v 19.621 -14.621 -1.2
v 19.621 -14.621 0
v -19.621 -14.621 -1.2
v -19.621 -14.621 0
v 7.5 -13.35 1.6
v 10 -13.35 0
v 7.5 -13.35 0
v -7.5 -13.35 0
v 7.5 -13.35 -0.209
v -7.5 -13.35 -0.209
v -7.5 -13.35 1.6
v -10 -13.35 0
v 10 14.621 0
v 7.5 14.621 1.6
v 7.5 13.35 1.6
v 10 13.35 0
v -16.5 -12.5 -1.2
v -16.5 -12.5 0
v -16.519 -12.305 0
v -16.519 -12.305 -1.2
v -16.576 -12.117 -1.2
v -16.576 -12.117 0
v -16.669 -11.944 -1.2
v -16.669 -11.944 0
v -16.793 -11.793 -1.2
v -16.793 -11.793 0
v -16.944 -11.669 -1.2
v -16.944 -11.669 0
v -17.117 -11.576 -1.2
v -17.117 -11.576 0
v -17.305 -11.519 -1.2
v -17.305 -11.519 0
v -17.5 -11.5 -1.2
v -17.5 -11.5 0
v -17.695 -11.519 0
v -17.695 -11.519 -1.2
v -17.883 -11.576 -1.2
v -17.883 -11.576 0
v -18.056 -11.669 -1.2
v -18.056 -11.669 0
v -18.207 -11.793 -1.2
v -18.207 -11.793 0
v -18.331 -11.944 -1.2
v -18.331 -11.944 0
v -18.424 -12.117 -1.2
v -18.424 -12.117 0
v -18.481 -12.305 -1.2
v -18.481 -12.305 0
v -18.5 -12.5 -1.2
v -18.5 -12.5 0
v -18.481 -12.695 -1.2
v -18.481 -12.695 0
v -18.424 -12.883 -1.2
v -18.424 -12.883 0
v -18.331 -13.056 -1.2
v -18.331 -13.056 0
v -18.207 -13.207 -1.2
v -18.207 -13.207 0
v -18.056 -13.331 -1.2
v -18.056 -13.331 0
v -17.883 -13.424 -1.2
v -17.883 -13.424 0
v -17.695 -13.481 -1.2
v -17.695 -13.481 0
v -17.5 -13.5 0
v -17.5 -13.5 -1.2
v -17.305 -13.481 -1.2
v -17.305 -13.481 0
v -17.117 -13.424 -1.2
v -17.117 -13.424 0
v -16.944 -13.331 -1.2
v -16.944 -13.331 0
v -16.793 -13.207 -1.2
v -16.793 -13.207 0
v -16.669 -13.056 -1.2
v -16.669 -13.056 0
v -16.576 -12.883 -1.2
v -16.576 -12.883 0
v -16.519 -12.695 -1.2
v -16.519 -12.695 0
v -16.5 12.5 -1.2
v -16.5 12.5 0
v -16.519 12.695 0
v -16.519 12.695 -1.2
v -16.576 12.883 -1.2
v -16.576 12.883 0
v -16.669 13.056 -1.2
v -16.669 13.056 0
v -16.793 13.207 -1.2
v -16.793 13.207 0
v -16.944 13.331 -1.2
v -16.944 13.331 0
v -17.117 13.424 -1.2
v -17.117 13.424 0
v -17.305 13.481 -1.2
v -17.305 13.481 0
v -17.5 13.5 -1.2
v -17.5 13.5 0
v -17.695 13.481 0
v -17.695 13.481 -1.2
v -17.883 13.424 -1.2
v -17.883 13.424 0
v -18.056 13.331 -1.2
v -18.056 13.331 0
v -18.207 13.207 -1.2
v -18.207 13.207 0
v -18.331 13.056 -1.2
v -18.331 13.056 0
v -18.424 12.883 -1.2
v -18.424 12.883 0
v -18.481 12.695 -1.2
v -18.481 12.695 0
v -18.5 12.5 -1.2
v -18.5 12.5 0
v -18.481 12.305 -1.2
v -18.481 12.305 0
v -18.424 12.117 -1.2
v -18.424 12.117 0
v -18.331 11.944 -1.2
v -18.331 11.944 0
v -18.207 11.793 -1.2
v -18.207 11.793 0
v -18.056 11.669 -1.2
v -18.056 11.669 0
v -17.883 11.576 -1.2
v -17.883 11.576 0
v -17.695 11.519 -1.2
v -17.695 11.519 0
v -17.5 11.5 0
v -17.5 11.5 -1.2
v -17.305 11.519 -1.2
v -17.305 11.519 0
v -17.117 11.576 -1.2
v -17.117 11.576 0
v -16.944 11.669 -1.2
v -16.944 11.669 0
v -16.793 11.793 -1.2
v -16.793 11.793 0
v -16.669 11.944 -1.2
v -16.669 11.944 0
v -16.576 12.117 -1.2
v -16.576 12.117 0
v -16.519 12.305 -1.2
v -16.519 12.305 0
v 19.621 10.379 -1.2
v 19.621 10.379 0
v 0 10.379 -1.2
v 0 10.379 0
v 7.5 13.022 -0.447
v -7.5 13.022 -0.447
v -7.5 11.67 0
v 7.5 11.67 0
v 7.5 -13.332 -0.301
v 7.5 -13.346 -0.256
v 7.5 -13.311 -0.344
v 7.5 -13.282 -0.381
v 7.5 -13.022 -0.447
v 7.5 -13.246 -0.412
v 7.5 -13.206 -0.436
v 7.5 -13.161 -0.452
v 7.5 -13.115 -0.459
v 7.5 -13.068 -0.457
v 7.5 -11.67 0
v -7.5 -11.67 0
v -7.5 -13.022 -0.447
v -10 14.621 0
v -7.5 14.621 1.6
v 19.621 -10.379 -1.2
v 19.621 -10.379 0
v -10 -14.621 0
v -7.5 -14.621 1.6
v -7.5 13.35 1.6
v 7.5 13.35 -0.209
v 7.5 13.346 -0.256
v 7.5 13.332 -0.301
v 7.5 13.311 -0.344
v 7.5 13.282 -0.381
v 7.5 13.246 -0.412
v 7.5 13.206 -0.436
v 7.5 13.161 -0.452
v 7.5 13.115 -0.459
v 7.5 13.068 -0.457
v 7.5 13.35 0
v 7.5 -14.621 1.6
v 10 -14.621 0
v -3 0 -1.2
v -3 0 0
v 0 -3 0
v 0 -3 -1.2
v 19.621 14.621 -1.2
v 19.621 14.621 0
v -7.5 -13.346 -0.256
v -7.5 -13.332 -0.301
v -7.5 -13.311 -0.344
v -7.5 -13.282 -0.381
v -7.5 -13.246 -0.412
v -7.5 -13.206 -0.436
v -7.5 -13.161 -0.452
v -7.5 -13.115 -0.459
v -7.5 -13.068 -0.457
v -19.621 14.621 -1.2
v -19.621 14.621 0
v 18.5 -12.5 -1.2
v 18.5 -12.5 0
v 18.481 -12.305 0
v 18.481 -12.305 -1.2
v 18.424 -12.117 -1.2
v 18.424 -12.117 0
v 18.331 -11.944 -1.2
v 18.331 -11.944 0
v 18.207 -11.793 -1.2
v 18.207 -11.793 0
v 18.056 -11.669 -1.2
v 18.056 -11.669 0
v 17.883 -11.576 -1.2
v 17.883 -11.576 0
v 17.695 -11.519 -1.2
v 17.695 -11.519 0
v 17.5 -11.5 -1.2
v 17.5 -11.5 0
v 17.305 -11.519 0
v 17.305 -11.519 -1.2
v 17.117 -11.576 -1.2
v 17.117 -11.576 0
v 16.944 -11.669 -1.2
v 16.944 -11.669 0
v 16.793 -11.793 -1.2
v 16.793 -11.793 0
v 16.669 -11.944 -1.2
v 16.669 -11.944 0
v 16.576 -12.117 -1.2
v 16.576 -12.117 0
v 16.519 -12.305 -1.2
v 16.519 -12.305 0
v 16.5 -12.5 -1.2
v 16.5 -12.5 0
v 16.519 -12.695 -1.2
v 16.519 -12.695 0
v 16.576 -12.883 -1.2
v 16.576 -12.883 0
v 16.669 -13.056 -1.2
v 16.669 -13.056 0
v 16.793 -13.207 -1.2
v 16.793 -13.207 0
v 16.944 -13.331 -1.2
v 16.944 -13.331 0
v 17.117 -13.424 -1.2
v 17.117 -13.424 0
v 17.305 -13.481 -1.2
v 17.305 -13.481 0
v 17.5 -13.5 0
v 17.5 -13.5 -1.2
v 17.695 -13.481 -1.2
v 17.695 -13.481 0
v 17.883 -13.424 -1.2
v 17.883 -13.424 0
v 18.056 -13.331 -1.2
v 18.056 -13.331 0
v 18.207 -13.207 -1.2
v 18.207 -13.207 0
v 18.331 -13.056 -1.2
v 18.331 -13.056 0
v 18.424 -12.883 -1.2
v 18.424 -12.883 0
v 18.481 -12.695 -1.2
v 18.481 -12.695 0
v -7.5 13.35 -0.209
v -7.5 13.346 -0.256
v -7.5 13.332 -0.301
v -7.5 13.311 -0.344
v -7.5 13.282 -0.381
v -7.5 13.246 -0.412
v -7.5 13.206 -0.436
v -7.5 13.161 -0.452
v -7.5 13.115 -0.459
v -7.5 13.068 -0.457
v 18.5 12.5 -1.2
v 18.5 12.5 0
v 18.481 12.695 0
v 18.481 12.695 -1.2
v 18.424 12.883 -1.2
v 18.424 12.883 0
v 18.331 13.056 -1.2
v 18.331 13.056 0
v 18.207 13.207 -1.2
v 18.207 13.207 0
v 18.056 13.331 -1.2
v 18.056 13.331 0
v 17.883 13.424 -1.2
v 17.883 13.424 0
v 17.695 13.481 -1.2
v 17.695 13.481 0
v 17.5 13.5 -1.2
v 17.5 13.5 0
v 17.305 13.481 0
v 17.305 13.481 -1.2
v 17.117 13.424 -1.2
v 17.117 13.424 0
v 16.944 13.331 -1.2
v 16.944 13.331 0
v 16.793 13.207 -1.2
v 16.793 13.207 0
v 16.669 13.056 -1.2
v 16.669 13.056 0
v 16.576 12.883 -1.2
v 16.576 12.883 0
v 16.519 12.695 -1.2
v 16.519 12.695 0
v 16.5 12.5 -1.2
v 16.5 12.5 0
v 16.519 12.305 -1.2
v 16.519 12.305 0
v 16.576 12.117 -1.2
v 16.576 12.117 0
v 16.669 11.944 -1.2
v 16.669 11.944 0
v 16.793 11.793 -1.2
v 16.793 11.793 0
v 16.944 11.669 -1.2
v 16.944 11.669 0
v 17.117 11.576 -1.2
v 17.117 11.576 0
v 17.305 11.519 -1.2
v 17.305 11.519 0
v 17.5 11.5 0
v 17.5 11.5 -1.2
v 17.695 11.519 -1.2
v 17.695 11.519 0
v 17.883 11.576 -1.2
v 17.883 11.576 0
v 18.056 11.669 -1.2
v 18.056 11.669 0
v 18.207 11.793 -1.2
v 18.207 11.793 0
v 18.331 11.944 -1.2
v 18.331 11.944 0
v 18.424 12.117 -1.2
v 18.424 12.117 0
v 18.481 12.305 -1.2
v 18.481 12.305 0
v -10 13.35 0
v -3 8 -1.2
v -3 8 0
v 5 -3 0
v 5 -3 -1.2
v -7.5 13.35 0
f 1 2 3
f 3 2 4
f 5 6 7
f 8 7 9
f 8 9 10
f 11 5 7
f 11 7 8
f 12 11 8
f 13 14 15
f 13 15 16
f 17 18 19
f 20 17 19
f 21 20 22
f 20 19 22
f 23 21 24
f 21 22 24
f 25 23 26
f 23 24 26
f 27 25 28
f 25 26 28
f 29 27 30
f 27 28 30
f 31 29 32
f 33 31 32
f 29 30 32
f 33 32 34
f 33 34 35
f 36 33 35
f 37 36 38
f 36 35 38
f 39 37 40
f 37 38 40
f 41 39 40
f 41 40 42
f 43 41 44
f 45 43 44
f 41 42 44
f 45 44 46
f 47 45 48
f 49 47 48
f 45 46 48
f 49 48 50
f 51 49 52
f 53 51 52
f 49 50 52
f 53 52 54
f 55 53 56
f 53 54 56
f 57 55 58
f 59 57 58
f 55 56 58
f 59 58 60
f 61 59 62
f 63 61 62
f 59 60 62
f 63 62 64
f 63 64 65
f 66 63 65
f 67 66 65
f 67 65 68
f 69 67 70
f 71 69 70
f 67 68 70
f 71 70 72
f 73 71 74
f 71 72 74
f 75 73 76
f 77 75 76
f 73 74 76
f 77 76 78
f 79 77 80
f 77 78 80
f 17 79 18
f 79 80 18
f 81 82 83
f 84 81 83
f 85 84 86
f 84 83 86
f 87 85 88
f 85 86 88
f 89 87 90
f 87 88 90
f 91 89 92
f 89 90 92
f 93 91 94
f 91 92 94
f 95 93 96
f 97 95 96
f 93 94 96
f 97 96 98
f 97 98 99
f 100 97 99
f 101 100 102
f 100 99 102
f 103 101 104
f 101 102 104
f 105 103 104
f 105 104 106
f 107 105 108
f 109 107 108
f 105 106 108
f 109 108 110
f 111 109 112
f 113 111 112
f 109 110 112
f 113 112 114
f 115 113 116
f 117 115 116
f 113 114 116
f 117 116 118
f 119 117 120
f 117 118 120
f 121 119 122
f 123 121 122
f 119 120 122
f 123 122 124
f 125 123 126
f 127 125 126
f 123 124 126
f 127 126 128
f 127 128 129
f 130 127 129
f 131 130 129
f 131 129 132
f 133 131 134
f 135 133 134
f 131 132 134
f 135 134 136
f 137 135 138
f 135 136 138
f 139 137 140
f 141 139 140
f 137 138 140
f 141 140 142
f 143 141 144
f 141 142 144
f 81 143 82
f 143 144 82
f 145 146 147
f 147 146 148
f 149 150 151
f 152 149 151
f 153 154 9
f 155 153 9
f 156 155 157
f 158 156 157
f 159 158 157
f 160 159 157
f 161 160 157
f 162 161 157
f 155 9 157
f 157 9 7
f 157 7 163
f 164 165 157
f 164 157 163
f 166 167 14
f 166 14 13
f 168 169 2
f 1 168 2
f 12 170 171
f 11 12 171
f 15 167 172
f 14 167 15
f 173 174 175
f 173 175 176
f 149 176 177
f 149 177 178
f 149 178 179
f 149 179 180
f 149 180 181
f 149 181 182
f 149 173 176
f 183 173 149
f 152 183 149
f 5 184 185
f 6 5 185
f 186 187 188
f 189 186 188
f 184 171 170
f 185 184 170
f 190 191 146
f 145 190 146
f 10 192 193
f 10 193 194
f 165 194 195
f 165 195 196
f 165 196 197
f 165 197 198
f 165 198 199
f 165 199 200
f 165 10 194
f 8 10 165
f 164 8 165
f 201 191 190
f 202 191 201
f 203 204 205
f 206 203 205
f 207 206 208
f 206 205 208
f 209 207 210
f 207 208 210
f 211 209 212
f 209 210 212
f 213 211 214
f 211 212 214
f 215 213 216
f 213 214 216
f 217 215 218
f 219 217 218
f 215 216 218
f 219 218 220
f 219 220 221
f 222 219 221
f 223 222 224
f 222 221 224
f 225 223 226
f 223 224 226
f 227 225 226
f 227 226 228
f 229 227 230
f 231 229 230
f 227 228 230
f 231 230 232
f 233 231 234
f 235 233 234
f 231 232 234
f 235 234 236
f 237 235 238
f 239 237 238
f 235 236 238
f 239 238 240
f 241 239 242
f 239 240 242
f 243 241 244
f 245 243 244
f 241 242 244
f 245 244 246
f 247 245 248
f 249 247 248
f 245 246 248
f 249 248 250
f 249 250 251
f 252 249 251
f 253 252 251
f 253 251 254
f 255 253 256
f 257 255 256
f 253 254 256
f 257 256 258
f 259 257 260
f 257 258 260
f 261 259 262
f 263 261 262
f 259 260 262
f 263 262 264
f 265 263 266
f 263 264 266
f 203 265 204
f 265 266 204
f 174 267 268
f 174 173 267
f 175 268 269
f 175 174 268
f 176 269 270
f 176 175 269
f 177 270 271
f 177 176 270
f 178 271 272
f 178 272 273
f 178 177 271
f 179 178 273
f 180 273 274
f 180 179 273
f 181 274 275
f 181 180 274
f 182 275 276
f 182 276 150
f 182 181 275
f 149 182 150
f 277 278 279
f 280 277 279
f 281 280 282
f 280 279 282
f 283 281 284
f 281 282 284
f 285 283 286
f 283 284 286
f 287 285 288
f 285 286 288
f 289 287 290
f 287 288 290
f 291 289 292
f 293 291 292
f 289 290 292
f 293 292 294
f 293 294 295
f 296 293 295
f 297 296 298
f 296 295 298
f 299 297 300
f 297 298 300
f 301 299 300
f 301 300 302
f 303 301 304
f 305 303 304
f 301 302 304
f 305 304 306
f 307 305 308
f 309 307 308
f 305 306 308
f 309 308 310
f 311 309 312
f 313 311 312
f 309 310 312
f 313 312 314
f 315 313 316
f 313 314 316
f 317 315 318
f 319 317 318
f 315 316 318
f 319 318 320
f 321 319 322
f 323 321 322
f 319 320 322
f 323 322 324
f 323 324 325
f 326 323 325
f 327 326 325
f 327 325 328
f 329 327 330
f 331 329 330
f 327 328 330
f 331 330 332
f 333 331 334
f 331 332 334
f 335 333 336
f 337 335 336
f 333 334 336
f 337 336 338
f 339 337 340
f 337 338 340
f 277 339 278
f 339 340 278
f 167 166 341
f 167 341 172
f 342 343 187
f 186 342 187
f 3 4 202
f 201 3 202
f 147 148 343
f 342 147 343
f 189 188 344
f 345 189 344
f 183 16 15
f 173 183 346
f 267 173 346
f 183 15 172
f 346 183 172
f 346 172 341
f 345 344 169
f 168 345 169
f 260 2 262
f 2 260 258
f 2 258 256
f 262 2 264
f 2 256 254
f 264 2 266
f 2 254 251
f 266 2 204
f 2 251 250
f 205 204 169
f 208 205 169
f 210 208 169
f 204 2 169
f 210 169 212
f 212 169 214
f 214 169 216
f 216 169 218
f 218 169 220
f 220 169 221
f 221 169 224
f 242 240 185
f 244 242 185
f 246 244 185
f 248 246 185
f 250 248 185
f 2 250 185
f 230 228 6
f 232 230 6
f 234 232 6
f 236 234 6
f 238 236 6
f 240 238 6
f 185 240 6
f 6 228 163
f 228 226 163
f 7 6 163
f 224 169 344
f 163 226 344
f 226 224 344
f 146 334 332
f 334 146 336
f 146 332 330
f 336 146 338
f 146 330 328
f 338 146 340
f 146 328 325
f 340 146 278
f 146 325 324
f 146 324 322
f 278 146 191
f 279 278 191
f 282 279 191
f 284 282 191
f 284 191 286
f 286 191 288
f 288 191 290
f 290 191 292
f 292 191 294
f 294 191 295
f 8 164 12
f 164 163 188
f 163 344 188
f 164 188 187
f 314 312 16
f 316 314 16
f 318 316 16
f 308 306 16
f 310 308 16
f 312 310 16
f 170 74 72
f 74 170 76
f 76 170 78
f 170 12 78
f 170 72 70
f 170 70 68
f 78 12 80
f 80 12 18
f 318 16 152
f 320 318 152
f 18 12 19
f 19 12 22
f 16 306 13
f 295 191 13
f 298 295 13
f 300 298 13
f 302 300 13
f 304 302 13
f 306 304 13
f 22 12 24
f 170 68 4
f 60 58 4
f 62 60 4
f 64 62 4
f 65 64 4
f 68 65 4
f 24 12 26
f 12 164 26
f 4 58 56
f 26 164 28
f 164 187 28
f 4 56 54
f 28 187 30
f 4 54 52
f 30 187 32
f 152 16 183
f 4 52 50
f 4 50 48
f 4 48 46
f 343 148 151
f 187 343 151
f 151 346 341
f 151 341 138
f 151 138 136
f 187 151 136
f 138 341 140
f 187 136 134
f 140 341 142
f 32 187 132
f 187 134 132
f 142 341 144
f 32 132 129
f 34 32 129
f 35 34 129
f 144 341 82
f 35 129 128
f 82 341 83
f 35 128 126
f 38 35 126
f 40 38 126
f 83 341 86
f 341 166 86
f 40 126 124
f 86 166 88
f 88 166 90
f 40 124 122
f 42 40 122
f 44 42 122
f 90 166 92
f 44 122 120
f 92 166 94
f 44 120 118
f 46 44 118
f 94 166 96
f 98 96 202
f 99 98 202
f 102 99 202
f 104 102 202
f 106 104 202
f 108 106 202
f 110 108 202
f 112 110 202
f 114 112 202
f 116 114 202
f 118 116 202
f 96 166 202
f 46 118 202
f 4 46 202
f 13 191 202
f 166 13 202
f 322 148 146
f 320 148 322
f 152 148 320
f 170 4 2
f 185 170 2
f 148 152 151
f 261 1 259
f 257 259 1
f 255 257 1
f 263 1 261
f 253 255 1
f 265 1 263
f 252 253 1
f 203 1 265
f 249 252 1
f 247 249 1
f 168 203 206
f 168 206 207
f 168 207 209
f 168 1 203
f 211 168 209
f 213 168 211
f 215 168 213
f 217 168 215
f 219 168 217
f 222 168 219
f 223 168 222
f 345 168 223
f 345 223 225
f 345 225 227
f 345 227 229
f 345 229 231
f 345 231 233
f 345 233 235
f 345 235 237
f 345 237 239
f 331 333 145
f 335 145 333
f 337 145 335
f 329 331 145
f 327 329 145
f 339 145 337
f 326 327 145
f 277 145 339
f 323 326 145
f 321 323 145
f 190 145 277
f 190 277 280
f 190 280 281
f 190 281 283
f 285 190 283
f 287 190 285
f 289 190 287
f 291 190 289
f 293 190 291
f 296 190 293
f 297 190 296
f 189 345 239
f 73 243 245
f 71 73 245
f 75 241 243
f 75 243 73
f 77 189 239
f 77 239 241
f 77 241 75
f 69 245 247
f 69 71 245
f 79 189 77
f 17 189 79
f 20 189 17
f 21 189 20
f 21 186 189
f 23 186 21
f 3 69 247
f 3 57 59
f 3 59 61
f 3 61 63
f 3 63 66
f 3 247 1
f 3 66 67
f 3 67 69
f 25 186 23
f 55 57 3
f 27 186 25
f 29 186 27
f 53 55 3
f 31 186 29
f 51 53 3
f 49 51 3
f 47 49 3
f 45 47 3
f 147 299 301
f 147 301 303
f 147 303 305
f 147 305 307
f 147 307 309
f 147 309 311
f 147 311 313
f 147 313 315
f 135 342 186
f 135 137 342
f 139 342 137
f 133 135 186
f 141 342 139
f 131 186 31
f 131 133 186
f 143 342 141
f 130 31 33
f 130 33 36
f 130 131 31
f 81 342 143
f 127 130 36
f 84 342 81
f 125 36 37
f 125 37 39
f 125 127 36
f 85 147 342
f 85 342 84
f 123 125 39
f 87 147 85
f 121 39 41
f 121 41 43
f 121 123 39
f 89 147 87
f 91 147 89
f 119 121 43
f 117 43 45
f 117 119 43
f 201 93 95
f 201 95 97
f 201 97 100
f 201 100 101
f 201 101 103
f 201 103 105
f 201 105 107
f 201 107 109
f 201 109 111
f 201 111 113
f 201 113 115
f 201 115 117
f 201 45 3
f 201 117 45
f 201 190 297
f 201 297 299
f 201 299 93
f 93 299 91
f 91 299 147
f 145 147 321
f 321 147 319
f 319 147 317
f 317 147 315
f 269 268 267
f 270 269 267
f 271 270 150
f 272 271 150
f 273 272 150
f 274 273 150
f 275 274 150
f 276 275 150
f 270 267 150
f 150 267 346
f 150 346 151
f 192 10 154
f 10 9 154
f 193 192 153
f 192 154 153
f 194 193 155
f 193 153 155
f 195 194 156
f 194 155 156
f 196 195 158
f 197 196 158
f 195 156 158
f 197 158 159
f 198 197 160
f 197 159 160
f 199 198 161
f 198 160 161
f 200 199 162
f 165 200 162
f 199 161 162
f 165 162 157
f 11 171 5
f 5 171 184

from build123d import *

# Parameters (mm, degrees)
SKETCH003_R     = 1
PAD_DEPTH       = 1.2
PAD014_DEPTH    = 1.2713
POCKET004_DEPTH = 7.5


with BuildPart() as part:
    # Sketch003 → Pad (new body)
    with BuildSketch(Plane.XY):
        Polygon((-19.62132, 14.62132), (-15.37868, 14.62132), (19.62132, 14.62132), (19.62132, 10.37868), (0, 10.37868), (-3, 8), (-3, 0), (0, -3), (5, -3), (19.62132, -10.37868), (19.62132, -14.62132), (-19.62132, -14.62132), align=None)
        with Locations((-17.5, 12.5)):
            Circle(SKETCH003_R, mode=Mode.SUBTRACT)
        with Locations((-17.5, -12.5)):
            Circle(SKETCH003_R, mode=Mode.SUBTRACT)
        with Locations((17.5, -12.5)):
            Circle(SKETCH003_R, mode=Mode.SUBTRACT)
        with Locations((17.5, 12.5)):
            Circle(SKETCH003_R, mode=Mode.SUBTRACT)
    extrude(amount=-PAD_DEPTH)

    # Sketch019 (on DatumPlane) → Pad014 (join)
    with BuildSketch(Plane.XZ.offset(14.6213)):
        Polygon((-10, 0), (-7.5, 1.6), (7.5, 1.6), (10, 0), align=None)
    pad014 = extrude(amount=-PAD014_DEPTH)

    # Sketch → Pocket004 (cut, symmetric)
    with BuildSketch(Plane.YZ):
        with BuildLine():
            ThreePointArc((-13.35, -0.209228), (-13.246442, -0.411848), (-13.021562, -0.446604))
            Line((-13.021562, -0.446604), (-11.67, 0))
            Line((-13.35, 0), (-11.67, 0))
            Line((-13.35, -0.209228), (-13.35, 0))
        make_face()
    pocket004 = extrude(amount=POCKET004_DEPTH, both=True, mode=Mode.SUBTRACT)

    # Mirrored: Pad014, Pocket004 across XZ
    add(pad014.mirror(Plane.XZ))
    add(pocket004.mirror(Plane.XZ), mode=Mode.SUBTRACT)


solid = part.part
